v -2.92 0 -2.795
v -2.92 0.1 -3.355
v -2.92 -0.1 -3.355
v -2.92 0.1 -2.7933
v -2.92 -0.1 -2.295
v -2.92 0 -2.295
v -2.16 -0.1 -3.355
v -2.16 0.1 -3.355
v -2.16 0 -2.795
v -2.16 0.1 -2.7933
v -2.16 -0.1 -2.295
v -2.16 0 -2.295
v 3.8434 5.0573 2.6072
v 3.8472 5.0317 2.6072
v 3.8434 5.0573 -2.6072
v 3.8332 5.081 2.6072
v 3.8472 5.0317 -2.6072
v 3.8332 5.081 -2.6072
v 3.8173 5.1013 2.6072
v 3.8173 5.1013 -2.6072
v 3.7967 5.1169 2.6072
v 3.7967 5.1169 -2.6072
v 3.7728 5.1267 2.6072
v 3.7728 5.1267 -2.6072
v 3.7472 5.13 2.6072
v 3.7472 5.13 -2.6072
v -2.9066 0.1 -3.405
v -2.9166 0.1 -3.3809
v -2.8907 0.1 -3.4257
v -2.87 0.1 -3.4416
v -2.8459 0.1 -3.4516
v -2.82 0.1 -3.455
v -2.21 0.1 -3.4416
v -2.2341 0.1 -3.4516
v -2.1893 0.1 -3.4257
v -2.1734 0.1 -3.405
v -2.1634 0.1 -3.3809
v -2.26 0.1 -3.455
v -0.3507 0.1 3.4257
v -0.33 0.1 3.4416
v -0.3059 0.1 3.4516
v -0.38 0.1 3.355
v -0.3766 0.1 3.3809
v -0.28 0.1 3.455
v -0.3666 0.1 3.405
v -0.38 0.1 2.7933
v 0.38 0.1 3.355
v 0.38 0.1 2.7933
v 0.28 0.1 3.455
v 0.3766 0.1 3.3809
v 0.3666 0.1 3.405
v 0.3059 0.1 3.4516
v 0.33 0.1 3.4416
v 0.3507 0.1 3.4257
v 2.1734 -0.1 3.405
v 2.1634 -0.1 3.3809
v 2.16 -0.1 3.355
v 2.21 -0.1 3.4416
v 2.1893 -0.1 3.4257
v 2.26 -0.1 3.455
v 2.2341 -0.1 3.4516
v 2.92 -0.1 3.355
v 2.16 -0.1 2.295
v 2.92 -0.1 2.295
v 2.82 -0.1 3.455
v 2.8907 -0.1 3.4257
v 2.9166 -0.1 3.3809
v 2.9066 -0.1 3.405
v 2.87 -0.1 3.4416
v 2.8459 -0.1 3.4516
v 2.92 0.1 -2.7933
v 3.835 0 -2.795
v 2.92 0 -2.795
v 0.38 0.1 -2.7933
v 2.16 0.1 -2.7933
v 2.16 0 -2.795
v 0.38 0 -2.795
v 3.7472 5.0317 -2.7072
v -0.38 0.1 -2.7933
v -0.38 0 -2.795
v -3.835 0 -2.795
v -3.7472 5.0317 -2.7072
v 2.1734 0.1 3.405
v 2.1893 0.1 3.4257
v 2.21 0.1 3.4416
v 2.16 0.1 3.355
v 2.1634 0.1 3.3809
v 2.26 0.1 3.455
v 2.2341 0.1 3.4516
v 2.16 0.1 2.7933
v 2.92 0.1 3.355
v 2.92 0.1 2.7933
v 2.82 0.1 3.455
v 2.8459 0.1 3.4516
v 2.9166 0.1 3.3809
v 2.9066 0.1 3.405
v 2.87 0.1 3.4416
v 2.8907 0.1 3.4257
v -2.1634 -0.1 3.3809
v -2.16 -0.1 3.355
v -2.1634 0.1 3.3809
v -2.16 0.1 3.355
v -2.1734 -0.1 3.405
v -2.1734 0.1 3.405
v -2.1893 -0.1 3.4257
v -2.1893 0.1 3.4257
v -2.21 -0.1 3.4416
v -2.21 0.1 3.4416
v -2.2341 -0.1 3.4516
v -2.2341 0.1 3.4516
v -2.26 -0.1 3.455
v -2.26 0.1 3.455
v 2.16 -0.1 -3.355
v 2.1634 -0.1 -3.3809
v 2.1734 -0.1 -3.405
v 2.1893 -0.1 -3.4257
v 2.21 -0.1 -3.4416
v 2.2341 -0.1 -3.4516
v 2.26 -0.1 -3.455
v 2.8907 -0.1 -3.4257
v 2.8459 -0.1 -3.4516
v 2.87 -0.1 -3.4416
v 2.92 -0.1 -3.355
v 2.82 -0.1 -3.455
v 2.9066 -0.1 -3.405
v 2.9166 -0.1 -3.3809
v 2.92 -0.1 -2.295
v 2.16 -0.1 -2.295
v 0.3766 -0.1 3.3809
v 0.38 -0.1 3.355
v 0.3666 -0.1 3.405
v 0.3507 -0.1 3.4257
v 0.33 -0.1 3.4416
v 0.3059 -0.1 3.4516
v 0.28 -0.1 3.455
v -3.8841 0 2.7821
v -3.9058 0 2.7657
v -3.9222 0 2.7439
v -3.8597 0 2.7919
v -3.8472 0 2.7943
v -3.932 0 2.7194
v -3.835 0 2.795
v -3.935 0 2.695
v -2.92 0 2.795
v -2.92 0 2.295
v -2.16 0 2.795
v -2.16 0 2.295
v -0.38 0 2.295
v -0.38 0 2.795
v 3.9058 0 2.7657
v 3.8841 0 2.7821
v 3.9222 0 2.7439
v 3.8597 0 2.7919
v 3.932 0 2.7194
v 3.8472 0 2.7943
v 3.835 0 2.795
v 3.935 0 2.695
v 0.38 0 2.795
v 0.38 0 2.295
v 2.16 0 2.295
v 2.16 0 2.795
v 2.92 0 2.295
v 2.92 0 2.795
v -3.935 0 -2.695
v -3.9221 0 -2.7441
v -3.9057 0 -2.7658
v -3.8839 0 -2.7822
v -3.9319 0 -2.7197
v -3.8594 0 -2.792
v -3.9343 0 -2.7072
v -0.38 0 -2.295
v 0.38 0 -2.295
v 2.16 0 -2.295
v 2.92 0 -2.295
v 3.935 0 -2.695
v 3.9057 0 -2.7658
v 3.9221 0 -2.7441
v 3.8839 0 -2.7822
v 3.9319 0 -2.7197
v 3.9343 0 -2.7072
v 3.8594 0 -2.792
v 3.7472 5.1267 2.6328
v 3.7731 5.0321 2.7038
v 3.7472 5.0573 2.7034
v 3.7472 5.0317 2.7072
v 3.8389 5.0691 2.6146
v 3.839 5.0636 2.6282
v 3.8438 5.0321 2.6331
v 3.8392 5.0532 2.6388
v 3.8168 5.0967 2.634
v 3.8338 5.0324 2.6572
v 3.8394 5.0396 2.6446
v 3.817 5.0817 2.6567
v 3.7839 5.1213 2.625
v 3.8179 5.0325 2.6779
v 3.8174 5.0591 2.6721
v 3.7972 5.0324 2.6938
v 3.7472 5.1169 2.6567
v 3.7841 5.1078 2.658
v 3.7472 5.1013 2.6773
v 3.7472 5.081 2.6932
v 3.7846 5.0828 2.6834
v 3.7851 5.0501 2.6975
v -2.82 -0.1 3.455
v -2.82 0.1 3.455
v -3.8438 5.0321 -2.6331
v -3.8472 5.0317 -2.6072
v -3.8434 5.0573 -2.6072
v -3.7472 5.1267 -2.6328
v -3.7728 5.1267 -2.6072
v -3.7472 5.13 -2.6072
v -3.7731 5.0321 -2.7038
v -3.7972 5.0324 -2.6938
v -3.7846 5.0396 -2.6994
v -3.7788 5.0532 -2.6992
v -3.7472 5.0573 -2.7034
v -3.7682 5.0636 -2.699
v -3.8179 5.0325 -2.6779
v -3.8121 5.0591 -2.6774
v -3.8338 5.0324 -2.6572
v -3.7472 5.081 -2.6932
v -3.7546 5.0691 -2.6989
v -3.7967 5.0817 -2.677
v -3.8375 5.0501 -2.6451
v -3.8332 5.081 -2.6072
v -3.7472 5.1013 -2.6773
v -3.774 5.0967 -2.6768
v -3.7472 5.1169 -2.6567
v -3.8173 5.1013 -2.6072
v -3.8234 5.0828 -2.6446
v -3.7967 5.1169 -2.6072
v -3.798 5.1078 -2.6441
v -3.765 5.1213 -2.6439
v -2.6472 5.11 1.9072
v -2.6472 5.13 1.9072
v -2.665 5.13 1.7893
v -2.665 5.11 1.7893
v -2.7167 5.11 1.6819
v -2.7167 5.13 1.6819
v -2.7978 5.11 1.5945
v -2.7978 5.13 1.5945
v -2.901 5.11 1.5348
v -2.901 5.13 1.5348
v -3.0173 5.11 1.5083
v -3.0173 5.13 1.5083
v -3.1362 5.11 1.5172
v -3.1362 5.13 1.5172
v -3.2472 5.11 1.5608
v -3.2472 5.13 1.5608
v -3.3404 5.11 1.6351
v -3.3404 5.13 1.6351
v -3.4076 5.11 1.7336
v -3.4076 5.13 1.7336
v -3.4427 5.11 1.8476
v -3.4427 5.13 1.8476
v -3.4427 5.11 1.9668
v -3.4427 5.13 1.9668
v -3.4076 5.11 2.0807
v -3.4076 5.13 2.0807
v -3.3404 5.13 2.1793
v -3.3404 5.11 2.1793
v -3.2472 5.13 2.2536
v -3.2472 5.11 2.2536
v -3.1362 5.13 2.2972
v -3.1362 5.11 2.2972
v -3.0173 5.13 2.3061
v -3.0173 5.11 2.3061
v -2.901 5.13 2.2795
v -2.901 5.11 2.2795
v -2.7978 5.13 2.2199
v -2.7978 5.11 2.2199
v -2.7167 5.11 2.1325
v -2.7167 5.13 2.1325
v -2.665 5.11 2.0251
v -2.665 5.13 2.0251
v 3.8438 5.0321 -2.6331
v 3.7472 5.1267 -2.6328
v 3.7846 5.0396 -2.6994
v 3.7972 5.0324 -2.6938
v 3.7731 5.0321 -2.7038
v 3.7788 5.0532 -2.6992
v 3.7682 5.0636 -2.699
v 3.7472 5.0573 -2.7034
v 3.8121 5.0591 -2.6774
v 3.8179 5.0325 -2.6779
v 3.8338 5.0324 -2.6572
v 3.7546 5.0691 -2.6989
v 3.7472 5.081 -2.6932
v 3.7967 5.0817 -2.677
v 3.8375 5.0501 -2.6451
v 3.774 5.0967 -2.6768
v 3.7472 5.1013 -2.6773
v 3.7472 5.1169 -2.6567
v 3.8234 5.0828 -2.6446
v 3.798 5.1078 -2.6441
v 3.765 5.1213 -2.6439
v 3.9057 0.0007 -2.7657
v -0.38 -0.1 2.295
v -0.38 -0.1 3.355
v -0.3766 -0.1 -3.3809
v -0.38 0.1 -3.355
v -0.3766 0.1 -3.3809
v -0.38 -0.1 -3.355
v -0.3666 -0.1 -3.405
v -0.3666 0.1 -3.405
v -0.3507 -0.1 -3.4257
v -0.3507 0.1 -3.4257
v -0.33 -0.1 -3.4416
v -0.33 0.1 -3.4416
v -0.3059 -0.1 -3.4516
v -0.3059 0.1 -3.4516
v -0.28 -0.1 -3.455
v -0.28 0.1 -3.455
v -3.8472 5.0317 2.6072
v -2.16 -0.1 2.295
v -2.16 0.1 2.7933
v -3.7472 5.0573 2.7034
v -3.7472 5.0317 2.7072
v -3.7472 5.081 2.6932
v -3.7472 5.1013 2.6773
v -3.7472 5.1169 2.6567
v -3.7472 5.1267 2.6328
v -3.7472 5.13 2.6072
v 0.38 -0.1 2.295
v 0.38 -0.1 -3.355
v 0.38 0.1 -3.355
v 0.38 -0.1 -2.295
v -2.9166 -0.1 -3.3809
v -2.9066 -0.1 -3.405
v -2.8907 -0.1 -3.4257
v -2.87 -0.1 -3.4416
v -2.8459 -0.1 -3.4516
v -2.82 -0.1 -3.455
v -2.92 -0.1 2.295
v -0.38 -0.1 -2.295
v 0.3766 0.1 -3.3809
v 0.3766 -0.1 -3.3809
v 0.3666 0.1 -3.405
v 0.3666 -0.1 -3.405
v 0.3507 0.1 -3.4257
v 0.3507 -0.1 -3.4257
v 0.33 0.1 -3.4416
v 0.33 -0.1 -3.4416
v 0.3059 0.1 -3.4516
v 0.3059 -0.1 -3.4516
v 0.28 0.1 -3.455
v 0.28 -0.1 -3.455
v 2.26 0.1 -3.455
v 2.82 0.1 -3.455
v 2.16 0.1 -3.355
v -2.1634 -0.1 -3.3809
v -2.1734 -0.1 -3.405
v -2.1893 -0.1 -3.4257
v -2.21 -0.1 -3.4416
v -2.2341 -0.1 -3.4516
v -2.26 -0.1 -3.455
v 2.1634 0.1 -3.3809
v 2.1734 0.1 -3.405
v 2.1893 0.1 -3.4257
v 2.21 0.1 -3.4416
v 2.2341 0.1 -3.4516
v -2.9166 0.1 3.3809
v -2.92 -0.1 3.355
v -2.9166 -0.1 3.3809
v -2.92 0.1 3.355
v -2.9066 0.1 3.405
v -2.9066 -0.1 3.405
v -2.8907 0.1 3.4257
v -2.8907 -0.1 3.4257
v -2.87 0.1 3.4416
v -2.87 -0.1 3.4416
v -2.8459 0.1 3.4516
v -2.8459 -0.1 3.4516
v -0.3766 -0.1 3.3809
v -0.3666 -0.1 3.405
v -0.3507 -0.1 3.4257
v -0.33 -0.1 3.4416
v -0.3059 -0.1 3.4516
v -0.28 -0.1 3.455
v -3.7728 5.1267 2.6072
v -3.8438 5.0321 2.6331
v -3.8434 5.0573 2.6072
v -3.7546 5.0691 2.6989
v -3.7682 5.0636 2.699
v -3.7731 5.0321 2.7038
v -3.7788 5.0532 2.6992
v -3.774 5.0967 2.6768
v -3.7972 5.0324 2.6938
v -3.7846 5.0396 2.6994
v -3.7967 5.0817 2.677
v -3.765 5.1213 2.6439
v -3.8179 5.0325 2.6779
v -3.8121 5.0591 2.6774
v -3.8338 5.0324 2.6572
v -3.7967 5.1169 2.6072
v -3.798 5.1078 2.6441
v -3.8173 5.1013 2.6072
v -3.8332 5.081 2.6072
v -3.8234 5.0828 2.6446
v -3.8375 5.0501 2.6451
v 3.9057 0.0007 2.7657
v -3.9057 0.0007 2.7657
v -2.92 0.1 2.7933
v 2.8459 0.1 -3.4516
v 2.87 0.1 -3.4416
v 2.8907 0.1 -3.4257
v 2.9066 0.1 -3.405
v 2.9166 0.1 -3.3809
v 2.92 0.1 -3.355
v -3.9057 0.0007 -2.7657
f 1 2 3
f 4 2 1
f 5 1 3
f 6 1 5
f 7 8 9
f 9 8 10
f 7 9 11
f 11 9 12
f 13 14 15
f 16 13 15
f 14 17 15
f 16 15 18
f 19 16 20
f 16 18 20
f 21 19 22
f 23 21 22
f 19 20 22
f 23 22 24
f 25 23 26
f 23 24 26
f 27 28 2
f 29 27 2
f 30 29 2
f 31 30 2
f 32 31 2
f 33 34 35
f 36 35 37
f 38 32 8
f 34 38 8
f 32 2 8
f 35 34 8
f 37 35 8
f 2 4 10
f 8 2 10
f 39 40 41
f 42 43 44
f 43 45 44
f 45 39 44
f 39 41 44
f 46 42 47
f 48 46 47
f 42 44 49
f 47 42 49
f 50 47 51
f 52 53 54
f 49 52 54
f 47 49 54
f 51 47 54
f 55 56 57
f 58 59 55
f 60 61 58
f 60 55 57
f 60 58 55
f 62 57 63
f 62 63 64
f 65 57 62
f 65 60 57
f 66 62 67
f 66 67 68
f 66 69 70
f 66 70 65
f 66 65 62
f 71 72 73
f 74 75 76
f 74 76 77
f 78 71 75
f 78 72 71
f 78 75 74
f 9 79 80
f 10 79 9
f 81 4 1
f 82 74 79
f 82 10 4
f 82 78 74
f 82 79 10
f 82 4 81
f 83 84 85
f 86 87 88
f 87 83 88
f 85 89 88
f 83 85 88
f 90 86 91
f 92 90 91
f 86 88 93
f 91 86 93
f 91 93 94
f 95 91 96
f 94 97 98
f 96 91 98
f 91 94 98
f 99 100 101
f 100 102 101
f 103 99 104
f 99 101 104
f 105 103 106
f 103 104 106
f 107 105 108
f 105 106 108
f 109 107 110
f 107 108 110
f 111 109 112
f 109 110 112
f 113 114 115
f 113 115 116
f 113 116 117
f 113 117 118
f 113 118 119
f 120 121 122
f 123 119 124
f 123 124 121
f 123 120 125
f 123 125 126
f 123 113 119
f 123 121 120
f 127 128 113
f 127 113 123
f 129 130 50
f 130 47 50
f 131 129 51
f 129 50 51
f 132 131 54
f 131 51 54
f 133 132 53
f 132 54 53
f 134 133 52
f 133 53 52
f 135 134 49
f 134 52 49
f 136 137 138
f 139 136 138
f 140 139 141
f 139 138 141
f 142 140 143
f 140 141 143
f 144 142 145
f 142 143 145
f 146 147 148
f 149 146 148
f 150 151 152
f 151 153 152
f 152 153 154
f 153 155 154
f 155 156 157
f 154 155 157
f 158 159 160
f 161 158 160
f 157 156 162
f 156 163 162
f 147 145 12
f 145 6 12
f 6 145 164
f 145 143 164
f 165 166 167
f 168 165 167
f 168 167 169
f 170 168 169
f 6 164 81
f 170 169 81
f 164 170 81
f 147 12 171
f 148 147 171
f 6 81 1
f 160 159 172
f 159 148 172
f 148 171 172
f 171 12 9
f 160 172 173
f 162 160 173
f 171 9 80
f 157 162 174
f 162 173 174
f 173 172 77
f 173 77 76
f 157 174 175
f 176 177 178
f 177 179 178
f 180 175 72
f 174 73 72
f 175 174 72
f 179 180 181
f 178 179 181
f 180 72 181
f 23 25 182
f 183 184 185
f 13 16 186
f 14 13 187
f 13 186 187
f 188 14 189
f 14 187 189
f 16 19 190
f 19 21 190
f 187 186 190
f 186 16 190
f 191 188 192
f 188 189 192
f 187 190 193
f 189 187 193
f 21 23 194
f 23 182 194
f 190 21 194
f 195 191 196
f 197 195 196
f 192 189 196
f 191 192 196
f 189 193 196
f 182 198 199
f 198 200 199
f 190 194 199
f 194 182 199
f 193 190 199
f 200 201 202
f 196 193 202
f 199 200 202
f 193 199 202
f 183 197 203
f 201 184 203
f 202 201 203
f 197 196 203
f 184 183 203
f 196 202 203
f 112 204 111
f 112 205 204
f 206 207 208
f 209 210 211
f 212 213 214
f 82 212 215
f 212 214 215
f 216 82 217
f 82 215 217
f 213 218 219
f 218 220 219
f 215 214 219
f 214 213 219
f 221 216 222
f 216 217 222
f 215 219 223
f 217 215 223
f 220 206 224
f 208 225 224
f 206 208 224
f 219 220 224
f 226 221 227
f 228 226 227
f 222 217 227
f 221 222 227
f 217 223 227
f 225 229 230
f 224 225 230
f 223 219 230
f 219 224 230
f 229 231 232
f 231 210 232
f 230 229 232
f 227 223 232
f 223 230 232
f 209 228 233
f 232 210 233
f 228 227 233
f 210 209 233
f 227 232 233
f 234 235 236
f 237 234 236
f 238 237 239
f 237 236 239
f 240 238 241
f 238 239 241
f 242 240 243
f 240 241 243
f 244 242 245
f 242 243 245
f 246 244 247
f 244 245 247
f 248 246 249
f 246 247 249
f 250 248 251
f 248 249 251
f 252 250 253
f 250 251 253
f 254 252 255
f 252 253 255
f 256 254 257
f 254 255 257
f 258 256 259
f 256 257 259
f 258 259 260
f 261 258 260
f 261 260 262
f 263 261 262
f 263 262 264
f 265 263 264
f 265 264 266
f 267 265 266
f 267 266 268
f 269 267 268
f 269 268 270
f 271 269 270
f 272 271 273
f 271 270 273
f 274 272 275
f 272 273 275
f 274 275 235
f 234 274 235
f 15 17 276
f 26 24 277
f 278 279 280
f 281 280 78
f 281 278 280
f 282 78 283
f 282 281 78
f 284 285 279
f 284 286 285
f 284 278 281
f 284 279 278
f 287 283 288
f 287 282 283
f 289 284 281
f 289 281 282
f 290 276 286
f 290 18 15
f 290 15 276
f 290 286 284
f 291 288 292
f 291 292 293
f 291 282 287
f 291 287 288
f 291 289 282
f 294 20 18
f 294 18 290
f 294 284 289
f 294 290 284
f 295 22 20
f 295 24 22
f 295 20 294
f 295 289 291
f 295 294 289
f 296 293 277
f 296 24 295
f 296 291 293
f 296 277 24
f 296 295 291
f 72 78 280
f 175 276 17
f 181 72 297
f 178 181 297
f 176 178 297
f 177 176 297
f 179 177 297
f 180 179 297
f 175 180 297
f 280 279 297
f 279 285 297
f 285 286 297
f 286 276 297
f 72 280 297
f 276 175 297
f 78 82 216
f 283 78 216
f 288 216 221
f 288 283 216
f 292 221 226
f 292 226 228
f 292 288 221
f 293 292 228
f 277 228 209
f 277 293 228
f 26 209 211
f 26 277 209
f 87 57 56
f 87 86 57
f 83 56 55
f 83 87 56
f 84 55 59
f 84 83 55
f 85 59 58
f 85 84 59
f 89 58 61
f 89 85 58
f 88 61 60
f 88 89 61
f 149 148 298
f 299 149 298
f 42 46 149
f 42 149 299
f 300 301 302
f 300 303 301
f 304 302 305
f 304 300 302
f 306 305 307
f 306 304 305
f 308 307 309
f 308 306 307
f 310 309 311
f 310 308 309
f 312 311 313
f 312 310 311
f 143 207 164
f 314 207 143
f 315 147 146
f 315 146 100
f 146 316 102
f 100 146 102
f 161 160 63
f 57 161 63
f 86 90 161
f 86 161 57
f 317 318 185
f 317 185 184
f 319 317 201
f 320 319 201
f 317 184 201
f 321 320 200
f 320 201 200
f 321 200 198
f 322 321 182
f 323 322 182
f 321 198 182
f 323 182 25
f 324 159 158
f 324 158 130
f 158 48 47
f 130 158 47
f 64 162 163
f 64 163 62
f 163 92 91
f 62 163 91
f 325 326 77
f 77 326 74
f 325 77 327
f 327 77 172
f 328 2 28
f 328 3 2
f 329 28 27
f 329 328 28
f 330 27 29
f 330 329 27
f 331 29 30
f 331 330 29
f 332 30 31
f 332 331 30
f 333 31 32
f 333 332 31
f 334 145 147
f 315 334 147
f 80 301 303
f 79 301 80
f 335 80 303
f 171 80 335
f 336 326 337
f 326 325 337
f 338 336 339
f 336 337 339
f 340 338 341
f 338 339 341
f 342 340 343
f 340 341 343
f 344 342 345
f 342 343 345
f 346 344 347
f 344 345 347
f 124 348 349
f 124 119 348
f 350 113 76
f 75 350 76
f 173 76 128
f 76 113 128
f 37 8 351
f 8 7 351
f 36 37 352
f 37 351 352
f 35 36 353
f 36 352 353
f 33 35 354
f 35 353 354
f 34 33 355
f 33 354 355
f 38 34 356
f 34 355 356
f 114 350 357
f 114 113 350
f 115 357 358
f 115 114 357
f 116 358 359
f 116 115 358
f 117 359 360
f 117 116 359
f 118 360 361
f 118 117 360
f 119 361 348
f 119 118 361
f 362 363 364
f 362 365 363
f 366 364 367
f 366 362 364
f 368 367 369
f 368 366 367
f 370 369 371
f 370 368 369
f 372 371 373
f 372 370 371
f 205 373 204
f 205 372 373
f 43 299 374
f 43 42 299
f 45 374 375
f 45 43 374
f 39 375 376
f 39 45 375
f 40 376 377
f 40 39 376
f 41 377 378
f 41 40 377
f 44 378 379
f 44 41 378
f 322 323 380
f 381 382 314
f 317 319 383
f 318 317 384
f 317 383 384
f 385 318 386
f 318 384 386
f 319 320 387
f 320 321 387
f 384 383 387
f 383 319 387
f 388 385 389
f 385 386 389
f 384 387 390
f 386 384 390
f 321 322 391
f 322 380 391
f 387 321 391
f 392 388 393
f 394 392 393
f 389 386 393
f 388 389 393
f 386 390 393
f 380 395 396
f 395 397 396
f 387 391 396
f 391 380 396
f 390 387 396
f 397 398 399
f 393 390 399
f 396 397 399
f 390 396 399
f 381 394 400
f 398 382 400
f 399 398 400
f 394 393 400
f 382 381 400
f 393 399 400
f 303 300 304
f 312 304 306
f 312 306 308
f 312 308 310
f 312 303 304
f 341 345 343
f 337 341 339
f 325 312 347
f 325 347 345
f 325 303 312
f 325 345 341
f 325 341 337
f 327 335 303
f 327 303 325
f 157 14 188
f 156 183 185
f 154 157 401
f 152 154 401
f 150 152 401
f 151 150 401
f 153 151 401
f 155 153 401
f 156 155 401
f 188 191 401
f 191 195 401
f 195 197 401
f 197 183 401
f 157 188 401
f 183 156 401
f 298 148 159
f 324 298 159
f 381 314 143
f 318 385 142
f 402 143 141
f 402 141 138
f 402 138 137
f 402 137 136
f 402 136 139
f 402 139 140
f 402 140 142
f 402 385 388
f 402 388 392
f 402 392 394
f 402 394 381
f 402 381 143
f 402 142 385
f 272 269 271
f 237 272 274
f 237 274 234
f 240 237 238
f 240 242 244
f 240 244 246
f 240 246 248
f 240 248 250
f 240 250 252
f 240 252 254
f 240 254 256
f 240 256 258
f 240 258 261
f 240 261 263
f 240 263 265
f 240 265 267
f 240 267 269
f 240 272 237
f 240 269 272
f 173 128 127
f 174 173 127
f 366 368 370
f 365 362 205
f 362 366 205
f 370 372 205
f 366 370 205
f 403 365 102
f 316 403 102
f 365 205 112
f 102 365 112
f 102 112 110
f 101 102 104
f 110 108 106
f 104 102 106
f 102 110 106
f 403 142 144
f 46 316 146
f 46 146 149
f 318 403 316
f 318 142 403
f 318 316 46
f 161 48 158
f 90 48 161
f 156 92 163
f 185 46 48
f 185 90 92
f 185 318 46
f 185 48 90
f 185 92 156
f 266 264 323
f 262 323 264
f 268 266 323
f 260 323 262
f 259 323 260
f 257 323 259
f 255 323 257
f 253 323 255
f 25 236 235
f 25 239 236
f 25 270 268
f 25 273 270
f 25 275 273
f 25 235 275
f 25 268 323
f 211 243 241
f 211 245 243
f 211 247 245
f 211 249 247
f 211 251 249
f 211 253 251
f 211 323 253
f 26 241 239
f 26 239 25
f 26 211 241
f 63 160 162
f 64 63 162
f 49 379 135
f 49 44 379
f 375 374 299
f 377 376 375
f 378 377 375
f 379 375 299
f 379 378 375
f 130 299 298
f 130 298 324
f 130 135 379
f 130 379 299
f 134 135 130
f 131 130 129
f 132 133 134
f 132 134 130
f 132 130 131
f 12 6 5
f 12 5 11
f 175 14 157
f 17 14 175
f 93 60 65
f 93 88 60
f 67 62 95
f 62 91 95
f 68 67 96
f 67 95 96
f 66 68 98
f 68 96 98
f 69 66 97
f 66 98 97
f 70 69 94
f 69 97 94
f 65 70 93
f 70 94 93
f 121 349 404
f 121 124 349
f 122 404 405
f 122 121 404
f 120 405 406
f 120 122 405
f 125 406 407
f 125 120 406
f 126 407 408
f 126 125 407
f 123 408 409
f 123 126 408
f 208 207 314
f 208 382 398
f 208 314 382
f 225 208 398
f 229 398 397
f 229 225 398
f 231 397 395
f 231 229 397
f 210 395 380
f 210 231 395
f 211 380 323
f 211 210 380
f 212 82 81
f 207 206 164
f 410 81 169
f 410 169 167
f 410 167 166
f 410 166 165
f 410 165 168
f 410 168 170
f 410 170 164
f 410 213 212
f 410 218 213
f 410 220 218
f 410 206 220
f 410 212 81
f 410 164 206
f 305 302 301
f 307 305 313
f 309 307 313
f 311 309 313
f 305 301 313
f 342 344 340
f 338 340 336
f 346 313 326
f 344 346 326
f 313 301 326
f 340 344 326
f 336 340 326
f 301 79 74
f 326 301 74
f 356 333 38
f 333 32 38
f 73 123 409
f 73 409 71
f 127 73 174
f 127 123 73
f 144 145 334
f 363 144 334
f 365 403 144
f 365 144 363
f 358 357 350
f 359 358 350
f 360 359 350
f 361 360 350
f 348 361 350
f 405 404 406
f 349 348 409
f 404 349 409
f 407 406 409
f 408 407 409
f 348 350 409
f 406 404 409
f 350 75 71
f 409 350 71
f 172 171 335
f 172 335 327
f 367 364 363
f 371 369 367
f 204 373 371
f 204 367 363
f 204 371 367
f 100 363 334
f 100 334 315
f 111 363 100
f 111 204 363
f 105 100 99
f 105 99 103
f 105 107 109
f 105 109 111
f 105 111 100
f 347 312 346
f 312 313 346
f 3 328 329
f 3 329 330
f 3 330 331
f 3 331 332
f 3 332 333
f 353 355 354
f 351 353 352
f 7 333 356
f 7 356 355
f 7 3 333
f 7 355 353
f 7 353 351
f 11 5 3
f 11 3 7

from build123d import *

# Parameters (mm, degrees)
SKETCH1_W           = 7.87
SKETCH1_H           = 5.59
BOSS_EXTRUDE1_DEPTH = 5.13
BOSS_EXTRUDE1_TAPER = 1
SKETCH2_W           = 0.76
SKETCH2_H           = 1.16
BOSS_EXTRUDE2_DEPTH = 0.1
FILLET1_R           = 0.1
SKETCH3_R           = 0.4
CUT_EXTRUDE1_DEPTH  = 0.02


with BuildPart() as part:
    # Sketch1 → Boss-Extrude1 (new body)
    with BuildSketch(Plane(origin=(0, 0, 0), x_dir=(1, 0, 0), z_dir=(0, 1, 0))):
        Rectangle(SKETCH1_W, SKETCH1_H)
    extrude(amount=BOSS_EXTRUDE1_DEPTH, taper=BOSS_EXTRUDE1_TAPER)

    # Sketch2 → Boss-Extrude2 (add, symmetric)
    with BuildSketch(Plane.XZ):
        with Locations((0, 2.875)):
            Rectangle(SKETCH2_W, SKETCH2_H)
        with Locations((2.54, 2.875)):
            Rectangle(SKETCH2_W, SKETCH2_H)
        with Locations((-2.54, 2.875)):
            Rectangle(SKETCH2_W, SKETCH2_H)
        with Locations((-2.54, -2.875)):
            Rectangle(SKETCH2_W, SKETCH2_H)
        with Locations((0, -2.875)):
            Rectangle(SKETCH2_W, SKETCH2_H)
        with Locations((2.54, -2.875)):
            Rectangle(SKETCH2_W, SKETCH2_H)
    extrude(amount=BOSS_EXTRUDE2_DEPTH, both=True)

    # Fillet1
    fillet1_edges = [part.edges().sort_by_distance(p)[0] for p in [
        (2.92, 0, -3.455),
        (2.16, 0, -3.455),
        (-3.845455517, 5.13, 0),
        (0, 5.13, 2.705455517),
        (-0.38, 0, 3.455),
        (0.38, 0, 3.455),
        (-2.92, 0, 3.455),
        (-2.16, 0, 3.455),
        (3.845455517, 5.13, 0),
        (2.16, 0, 3.455),
        (2.92, 0, 3.455),
        (-2.16, 0, -3.455),
        (-2.92, 0, -3.455),
        (3.890227758, 2.565, 2.750227758),
        (-3.890227758, 2.565, 2.750227758),
        (-3.890227758, 2.565, -2.750227758),
        (3.890227758, 2.565, -2.750227758),
        (0.38, 0, -3.455),
        (-0.38, 0, -3.455),
        (0, 5.13, -2.705455517),
    ]]
    fillet(fillet1_edges, radius=FILLET1_R)

    # Sketch3 → Cut-Extrude1 (cut)
    with BuildSketch(Plane(origin=(0, 5.13, 0), x_dir=(1, 0, 0), z_dir=(0, 1, 0))):
        with Locations((-3.047185791, -1.907185791)):
            Circle(SKETCH3_R)
    extrude(amount=-CUT_EXTRUDE1_DEPTH, mode=Mode.SUBTRACT)


solid = part.part
